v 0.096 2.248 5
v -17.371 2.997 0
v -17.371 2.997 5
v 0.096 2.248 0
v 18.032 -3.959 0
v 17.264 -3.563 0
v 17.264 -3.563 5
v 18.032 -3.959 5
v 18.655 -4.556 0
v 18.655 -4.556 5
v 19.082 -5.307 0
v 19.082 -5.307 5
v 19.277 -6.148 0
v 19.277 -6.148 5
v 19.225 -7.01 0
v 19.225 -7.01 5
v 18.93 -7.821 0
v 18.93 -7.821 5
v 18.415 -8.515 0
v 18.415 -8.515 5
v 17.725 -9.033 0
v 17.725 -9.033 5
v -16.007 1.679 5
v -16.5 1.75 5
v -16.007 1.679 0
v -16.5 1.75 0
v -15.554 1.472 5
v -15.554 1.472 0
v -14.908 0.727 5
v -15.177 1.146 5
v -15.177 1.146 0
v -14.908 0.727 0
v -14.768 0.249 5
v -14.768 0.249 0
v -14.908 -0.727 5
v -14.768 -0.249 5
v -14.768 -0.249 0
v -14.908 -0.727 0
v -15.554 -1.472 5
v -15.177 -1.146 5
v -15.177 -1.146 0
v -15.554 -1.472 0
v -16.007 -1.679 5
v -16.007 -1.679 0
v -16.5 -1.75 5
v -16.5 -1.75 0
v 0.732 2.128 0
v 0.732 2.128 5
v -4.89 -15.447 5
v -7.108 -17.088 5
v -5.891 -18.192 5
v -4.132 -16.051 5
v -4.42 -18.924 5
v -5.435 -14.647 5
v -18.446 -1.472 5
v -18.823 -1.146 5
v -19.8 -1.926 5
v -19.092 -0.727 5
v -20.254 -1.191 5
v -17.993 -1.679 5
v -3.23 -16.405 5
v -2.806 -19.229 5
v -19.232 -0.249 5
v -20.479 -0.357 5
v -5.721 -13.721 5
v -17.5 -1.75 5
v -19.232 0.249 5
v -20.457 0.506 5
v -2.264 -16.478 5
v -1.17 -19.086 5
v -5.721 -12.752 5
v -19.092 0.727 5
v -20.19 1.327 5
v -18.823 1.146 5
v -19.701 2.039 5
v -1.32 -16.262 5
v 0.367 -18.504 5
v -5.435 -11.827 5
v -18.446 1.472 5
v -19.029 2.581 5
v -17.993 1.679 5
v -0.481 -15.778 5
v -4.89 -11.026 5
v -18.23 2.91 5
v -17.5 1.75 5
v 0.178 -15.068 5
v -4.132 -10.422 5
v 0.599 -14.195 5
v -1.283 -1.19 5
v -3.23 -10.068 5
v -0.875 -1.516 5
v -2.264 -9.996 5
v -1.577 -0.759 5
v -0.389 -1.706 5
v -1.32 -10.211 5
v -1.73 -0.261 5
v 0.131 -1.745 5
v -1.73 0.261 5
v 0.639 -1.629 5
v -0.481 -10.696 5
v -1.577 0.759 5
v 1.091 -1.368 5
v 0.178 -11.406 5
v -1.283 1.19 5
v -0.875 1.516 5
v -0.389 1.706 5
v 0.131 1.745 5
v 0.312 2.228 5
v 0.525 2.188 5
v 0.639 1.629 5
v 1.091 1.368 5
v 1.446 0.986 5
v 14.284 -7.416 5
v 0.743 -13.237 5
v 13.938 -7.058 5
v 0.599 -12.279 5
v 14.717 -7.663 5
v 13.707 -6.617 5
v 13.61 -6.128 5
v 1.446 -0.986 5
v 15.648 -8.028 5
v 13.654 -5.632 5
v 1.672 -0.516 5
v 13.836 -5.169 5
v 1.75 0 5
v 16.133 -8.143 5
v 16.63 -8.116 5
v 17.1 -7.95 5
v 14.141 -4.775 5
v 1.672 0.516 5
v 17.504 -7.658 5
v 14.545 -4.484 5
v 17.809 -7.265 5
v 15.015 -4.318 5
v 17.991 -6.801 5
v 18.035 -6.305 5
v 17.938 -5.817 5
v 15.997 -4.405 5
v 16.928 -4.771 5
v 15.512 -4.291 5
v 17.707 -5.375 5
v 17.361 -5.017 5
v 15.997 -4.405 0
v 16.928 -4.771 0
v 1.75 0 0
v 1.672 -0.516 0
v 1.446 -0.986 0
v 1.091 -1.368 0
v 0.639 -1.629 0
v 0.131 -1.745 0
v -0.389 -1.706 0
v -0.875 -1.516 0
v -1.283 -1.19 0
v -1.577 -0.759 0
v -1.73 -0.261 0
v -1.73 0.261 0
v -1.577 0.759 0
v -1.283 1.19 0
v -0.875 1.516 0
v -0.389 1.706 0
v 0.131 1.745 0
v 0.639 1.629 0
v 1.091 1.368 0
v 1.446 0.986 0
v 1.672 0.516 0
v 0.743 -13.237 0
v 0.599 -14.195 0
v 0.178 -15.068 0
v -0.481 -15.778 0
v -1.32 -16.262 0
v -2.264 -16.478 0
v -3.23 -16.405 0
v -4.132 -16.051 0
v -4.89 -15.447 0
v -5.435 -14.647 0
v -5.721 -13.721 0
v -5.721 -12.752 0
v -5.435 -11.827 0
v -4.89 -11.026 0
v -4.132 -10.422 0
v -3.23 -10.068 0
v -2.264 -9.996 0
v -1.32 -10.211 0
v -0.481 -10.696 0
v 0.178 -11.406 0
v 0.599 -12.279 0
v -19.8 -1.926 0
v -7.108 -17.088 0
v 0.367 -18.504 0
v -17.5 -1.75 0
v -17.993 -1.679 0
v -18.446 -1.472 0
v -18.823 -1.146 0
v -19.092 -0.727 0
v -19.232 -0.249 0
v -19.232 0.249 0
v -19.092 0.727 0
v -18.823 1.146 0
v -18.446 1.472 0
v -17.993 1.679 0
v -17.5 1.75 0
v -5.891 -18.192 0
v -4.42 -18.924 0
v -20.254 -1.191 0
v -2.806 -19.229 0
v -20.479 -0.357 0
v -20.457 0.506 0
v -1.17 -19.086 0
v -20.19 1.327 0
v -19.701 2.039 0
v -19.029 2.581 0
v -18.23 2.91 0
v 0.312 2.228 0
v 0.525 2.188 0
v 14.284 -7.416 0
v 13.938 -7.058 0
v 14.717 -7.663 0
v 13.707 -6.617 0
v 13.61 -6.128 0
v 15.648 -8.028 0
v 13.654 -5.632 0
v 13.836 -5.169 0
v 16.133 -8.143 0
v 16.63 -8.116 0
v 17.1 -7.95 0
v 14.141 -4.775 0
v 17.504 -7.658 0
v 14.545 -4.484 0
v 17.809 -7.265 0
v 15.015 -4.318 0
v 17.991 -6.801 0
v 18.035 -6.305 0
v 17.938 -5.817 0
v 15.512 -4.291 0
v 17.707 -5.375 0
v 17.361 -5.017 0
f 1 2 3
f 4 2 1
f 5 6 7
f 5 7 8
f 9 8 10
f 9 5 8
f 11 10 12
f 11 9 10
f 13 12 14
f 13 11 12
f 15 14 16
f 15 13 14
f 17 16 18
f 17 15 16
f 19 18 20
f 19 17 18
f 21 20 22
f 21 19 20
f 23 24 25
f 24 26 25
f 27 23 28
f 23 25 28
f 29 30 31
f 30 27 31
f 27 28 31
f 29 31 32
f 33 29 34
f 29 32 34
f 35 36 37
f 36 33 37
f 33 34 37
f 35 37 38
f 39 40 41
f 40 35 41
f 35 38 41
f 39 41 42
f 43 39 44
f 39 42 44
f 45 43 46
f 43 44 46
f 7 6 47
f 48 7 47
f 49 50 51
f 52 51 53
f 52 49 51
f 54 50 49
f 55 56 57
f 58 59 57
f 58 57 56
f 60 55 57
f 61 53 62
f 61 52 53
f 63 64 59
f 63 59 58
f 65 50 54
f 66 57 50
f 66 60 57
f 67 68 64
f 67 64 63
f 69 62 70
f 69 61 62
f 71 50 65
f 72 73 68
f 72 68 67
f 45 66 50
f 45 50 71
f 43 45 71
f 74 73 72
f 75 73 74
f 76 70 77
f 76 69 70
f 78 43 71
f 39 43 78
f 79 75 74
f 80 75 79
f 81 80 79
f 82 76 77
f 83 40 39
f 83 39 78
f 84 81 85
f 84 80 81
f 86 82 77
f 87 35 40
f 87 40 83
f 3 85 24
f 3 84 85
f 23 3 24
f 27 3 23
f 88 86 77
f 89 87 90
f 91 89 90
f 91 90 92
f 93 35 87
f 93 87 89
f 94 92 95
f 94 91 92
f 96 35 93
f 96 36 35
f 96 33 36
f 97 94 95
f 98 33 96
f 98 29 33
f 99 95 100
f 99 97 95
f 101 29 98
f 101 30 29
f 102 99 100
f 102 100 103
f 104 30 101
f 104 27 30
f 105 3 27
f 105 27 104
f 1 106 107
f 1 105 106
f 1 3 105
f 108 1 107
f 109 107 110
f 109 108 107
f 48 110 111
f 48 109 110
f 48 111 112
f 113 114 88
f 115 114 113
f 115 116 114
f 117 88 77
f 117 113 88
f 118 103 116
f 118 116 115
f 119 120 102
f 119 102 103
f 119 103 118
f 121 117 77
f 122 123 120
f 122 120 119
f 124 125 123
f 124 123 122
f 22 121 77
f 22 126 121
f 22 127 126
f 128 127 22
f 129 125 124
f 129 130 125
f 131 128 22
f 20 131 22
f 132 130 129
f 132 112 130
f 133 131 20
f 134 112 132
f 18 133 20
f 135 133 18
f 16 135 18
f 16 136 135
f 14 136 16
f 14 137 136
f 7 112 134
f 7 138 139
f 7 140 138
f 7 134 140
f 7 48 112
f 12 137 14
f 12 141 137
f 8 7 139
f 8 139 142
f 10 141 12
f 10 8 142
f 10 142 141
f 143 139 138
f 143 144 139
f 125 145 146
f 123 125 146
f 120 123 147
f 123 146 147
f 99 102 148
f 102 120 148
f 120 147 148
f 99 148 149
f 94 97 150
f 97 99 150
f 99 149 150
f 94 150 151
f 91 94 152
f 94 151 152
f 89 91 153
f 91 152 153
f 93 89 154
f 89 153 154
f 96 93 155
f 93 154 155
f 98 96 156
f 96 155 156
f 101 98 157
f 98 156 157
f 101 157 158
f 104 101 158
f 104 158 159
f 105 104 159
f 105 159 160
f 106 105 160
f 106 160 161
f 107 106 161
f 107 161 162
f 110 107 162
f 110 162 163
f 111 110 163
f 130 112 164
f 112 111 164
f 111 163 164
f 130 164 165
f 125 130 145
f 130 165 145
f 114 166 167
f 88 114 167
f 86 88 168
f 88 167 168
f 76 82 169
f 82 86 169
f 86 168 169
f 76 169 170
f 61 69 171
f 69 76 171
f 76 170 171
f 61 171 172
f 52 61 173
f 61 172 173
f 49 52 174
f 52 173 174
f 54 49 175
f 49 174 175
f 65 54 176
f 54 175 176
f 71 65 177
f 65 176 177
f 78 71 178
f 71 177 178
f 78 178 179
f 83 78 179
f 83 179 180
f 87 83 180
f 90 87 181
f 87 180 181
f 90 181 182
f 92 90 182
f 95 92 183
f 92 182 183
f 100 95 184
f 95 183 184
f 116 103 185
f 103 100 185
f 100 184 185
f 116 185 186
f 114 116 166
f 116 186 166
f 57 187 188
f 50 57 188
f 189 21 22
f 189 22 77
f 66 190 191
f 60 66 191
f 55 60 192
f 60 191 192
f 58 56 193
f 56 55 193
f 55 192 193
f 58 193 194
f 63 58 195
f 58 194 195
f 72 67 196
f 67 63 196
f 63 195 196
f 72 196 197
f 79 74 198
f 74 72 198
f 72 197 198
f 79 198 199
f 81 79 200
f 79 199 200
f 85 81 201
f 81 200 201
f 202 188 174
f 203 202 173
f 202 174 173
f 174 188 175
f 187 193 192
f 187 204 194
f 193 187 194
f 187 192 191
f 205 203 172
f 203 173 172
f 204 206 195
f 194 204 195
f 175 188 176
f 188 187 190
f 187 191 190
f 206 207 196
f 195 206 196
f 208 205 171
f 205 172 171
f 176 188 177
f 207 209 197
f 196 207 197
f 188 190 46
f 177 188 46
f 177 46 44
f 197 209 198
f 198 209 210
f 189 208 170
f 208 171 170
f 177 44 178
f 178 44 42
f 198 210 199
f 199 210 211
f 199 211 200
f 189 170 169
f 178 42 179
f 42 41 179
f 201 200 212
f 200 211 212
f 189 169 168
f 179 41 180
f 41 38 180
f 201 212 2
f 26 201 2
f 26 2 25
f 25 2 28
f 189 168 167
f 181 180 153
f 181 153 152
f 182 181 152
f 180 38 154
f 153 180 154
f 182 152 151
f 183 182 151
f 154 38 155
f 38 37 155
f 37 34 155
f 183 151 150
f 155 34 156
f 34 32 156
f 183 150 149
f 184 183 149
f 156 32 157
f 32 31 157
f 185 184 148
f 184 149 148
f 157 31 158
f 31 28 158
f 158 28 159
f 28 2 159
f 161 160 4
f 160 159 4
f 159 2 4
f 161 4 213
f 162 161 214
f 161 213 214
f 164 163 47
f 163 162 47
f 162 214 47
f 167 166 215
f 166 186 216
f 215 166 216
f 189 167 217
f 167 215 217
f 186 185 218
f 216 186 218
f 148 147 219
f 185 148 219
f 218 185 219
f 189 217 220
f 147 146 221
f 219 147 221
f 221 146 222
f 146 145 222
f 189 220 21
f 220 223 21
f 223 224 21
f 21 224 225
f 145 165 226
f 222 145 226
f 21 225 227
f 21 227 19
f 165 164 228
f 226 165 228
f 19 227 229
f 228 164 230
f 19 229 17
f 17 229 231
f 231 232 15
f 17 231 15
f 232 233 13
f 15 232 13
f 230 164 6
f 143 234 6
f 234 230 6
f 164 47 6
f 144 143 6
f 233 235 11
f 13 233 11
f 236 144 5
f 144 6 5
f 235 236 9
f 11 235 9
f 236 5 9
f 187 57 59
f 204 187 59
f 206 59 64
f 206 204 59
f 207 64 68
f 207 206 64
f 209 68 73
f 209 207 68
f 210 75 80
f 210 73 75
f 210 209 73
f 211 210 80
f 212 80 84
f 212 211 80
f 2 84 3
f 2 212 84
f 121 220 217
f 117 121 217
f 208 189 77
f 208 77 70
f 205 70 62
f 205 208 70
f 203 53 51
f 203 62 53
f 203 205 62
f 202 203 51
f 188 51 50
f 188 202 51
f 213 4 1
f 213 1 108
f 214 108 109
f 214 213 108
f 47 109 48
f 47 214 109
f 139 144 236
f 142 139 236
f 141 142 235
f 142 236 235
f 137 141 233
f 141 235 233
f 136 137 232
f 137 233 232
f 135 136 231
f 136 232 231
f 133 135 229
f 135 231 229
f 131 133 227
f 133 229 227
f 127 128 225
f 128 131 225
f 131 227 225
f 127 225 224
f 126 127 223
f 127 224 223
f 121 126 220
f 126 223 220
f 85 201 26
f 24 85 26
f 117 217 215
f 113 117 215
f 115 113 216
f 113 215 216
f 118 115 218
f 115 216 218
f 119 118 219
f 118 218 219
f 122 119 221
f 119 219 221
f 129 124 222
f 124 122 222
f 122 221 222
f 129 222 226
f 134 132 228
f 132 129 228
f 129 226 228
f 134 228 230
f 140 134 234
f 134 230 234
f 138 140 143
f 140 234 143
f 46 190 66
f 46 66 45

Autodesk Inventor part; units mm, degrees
ref_plane "YZ Plane" through (0, 0, 0) normal (1, 0, 0) x (0, 1, 0)
ref_plane "XZ Plane" through (0, 0, 0) normal (0, 1, 0) x (-1, 0, 0)
ref_plane "XY Plane" through (0, 0, 0) normal (0, 0, 1) x (1, 0, 0)
sketch "Sketch1" plane through (0, 0, 0) normal (0, 0, 1) x (1, 0, 0)
  circle A0 centre (0, 0) radius 1.75
  arc A1 (-16.5, -1.75) -> (-16.5, 1.75) centre (-16.5, 0) ccw
  arc A2 (-17.5, 1.75) -> (-17.5, -1.75) centre (-17.5, 0) ccw
  line L0 (-17.5, 1.75) -> (-16.5, 1.75)
  line L1 (-17.5, -1.75) -> (-16.5, -1.75)
  arc A3 (15.9971, -4.4051) -> (14.7172, -7.6627) centre (15.3572, -6.0339) ccw
  arc A4 (15.6479, -8.0283) -> (16.9279, -4.7708) centre (16.2879, -6.3996) ccw
  line L2 (15.6479, -8.0283) -> (14.7172, -7.6627)
  line L3 (16.9279, -4.7708) -> (15.9971, -4.4051)
  circle A5 centre (16.2879, -6.3996) radius 3
  circle A6 centre (-17.5, 0) radius 3
  circle A7 centre (0, 0) radius 2.25
  line L4 (-17.3714, 2.9972) -> (0.0964, 2.2479)
  line L5 (17.2643, -3.5629) -> (0.7323, 2.1275)
  line L6 (-17.6714, -2.9951) -> (-2.0561, -3.8889)
  line L7 (15.3522, -9.2499) -> (0.4916, -4.3714)
  arc A8 (0.4916, -4.3714) -> (-2.0561, -3.8889) centre (-2.6275, -13.8725) ccw
  circle A9 centre (-2.5071, -13.2368) radius 3.25
  circle A10 centre (-2.5071, -13.2368) radius 6
  line L8 (-19.8004, -1.9257) -> (-7.1079, -17.0881)
  line L9 (17.7248, -9.0331) -> (0.3666, -18.5038)
  dimension "d0" = 3.5
  dimension "d1" = 3.5
  dimension "d2" = 3.5
  dimension "d5" = 158.55
  dimension "d7" = 6
  dimension "d9" = 6
  dimension "d10" = 4.5
  dimension "d11" = 10
  dimension "d14" = 0
  dimension "d15" = 0
  dimension "d18" = 6.5
  dimension "d19" = 12
  dimension "d20" = 20
  dimension "d21" = 20
extrude "Extrusion1" add sketch "Sketch1" along normal blind 5
properties part number "CoinLockOpener"
